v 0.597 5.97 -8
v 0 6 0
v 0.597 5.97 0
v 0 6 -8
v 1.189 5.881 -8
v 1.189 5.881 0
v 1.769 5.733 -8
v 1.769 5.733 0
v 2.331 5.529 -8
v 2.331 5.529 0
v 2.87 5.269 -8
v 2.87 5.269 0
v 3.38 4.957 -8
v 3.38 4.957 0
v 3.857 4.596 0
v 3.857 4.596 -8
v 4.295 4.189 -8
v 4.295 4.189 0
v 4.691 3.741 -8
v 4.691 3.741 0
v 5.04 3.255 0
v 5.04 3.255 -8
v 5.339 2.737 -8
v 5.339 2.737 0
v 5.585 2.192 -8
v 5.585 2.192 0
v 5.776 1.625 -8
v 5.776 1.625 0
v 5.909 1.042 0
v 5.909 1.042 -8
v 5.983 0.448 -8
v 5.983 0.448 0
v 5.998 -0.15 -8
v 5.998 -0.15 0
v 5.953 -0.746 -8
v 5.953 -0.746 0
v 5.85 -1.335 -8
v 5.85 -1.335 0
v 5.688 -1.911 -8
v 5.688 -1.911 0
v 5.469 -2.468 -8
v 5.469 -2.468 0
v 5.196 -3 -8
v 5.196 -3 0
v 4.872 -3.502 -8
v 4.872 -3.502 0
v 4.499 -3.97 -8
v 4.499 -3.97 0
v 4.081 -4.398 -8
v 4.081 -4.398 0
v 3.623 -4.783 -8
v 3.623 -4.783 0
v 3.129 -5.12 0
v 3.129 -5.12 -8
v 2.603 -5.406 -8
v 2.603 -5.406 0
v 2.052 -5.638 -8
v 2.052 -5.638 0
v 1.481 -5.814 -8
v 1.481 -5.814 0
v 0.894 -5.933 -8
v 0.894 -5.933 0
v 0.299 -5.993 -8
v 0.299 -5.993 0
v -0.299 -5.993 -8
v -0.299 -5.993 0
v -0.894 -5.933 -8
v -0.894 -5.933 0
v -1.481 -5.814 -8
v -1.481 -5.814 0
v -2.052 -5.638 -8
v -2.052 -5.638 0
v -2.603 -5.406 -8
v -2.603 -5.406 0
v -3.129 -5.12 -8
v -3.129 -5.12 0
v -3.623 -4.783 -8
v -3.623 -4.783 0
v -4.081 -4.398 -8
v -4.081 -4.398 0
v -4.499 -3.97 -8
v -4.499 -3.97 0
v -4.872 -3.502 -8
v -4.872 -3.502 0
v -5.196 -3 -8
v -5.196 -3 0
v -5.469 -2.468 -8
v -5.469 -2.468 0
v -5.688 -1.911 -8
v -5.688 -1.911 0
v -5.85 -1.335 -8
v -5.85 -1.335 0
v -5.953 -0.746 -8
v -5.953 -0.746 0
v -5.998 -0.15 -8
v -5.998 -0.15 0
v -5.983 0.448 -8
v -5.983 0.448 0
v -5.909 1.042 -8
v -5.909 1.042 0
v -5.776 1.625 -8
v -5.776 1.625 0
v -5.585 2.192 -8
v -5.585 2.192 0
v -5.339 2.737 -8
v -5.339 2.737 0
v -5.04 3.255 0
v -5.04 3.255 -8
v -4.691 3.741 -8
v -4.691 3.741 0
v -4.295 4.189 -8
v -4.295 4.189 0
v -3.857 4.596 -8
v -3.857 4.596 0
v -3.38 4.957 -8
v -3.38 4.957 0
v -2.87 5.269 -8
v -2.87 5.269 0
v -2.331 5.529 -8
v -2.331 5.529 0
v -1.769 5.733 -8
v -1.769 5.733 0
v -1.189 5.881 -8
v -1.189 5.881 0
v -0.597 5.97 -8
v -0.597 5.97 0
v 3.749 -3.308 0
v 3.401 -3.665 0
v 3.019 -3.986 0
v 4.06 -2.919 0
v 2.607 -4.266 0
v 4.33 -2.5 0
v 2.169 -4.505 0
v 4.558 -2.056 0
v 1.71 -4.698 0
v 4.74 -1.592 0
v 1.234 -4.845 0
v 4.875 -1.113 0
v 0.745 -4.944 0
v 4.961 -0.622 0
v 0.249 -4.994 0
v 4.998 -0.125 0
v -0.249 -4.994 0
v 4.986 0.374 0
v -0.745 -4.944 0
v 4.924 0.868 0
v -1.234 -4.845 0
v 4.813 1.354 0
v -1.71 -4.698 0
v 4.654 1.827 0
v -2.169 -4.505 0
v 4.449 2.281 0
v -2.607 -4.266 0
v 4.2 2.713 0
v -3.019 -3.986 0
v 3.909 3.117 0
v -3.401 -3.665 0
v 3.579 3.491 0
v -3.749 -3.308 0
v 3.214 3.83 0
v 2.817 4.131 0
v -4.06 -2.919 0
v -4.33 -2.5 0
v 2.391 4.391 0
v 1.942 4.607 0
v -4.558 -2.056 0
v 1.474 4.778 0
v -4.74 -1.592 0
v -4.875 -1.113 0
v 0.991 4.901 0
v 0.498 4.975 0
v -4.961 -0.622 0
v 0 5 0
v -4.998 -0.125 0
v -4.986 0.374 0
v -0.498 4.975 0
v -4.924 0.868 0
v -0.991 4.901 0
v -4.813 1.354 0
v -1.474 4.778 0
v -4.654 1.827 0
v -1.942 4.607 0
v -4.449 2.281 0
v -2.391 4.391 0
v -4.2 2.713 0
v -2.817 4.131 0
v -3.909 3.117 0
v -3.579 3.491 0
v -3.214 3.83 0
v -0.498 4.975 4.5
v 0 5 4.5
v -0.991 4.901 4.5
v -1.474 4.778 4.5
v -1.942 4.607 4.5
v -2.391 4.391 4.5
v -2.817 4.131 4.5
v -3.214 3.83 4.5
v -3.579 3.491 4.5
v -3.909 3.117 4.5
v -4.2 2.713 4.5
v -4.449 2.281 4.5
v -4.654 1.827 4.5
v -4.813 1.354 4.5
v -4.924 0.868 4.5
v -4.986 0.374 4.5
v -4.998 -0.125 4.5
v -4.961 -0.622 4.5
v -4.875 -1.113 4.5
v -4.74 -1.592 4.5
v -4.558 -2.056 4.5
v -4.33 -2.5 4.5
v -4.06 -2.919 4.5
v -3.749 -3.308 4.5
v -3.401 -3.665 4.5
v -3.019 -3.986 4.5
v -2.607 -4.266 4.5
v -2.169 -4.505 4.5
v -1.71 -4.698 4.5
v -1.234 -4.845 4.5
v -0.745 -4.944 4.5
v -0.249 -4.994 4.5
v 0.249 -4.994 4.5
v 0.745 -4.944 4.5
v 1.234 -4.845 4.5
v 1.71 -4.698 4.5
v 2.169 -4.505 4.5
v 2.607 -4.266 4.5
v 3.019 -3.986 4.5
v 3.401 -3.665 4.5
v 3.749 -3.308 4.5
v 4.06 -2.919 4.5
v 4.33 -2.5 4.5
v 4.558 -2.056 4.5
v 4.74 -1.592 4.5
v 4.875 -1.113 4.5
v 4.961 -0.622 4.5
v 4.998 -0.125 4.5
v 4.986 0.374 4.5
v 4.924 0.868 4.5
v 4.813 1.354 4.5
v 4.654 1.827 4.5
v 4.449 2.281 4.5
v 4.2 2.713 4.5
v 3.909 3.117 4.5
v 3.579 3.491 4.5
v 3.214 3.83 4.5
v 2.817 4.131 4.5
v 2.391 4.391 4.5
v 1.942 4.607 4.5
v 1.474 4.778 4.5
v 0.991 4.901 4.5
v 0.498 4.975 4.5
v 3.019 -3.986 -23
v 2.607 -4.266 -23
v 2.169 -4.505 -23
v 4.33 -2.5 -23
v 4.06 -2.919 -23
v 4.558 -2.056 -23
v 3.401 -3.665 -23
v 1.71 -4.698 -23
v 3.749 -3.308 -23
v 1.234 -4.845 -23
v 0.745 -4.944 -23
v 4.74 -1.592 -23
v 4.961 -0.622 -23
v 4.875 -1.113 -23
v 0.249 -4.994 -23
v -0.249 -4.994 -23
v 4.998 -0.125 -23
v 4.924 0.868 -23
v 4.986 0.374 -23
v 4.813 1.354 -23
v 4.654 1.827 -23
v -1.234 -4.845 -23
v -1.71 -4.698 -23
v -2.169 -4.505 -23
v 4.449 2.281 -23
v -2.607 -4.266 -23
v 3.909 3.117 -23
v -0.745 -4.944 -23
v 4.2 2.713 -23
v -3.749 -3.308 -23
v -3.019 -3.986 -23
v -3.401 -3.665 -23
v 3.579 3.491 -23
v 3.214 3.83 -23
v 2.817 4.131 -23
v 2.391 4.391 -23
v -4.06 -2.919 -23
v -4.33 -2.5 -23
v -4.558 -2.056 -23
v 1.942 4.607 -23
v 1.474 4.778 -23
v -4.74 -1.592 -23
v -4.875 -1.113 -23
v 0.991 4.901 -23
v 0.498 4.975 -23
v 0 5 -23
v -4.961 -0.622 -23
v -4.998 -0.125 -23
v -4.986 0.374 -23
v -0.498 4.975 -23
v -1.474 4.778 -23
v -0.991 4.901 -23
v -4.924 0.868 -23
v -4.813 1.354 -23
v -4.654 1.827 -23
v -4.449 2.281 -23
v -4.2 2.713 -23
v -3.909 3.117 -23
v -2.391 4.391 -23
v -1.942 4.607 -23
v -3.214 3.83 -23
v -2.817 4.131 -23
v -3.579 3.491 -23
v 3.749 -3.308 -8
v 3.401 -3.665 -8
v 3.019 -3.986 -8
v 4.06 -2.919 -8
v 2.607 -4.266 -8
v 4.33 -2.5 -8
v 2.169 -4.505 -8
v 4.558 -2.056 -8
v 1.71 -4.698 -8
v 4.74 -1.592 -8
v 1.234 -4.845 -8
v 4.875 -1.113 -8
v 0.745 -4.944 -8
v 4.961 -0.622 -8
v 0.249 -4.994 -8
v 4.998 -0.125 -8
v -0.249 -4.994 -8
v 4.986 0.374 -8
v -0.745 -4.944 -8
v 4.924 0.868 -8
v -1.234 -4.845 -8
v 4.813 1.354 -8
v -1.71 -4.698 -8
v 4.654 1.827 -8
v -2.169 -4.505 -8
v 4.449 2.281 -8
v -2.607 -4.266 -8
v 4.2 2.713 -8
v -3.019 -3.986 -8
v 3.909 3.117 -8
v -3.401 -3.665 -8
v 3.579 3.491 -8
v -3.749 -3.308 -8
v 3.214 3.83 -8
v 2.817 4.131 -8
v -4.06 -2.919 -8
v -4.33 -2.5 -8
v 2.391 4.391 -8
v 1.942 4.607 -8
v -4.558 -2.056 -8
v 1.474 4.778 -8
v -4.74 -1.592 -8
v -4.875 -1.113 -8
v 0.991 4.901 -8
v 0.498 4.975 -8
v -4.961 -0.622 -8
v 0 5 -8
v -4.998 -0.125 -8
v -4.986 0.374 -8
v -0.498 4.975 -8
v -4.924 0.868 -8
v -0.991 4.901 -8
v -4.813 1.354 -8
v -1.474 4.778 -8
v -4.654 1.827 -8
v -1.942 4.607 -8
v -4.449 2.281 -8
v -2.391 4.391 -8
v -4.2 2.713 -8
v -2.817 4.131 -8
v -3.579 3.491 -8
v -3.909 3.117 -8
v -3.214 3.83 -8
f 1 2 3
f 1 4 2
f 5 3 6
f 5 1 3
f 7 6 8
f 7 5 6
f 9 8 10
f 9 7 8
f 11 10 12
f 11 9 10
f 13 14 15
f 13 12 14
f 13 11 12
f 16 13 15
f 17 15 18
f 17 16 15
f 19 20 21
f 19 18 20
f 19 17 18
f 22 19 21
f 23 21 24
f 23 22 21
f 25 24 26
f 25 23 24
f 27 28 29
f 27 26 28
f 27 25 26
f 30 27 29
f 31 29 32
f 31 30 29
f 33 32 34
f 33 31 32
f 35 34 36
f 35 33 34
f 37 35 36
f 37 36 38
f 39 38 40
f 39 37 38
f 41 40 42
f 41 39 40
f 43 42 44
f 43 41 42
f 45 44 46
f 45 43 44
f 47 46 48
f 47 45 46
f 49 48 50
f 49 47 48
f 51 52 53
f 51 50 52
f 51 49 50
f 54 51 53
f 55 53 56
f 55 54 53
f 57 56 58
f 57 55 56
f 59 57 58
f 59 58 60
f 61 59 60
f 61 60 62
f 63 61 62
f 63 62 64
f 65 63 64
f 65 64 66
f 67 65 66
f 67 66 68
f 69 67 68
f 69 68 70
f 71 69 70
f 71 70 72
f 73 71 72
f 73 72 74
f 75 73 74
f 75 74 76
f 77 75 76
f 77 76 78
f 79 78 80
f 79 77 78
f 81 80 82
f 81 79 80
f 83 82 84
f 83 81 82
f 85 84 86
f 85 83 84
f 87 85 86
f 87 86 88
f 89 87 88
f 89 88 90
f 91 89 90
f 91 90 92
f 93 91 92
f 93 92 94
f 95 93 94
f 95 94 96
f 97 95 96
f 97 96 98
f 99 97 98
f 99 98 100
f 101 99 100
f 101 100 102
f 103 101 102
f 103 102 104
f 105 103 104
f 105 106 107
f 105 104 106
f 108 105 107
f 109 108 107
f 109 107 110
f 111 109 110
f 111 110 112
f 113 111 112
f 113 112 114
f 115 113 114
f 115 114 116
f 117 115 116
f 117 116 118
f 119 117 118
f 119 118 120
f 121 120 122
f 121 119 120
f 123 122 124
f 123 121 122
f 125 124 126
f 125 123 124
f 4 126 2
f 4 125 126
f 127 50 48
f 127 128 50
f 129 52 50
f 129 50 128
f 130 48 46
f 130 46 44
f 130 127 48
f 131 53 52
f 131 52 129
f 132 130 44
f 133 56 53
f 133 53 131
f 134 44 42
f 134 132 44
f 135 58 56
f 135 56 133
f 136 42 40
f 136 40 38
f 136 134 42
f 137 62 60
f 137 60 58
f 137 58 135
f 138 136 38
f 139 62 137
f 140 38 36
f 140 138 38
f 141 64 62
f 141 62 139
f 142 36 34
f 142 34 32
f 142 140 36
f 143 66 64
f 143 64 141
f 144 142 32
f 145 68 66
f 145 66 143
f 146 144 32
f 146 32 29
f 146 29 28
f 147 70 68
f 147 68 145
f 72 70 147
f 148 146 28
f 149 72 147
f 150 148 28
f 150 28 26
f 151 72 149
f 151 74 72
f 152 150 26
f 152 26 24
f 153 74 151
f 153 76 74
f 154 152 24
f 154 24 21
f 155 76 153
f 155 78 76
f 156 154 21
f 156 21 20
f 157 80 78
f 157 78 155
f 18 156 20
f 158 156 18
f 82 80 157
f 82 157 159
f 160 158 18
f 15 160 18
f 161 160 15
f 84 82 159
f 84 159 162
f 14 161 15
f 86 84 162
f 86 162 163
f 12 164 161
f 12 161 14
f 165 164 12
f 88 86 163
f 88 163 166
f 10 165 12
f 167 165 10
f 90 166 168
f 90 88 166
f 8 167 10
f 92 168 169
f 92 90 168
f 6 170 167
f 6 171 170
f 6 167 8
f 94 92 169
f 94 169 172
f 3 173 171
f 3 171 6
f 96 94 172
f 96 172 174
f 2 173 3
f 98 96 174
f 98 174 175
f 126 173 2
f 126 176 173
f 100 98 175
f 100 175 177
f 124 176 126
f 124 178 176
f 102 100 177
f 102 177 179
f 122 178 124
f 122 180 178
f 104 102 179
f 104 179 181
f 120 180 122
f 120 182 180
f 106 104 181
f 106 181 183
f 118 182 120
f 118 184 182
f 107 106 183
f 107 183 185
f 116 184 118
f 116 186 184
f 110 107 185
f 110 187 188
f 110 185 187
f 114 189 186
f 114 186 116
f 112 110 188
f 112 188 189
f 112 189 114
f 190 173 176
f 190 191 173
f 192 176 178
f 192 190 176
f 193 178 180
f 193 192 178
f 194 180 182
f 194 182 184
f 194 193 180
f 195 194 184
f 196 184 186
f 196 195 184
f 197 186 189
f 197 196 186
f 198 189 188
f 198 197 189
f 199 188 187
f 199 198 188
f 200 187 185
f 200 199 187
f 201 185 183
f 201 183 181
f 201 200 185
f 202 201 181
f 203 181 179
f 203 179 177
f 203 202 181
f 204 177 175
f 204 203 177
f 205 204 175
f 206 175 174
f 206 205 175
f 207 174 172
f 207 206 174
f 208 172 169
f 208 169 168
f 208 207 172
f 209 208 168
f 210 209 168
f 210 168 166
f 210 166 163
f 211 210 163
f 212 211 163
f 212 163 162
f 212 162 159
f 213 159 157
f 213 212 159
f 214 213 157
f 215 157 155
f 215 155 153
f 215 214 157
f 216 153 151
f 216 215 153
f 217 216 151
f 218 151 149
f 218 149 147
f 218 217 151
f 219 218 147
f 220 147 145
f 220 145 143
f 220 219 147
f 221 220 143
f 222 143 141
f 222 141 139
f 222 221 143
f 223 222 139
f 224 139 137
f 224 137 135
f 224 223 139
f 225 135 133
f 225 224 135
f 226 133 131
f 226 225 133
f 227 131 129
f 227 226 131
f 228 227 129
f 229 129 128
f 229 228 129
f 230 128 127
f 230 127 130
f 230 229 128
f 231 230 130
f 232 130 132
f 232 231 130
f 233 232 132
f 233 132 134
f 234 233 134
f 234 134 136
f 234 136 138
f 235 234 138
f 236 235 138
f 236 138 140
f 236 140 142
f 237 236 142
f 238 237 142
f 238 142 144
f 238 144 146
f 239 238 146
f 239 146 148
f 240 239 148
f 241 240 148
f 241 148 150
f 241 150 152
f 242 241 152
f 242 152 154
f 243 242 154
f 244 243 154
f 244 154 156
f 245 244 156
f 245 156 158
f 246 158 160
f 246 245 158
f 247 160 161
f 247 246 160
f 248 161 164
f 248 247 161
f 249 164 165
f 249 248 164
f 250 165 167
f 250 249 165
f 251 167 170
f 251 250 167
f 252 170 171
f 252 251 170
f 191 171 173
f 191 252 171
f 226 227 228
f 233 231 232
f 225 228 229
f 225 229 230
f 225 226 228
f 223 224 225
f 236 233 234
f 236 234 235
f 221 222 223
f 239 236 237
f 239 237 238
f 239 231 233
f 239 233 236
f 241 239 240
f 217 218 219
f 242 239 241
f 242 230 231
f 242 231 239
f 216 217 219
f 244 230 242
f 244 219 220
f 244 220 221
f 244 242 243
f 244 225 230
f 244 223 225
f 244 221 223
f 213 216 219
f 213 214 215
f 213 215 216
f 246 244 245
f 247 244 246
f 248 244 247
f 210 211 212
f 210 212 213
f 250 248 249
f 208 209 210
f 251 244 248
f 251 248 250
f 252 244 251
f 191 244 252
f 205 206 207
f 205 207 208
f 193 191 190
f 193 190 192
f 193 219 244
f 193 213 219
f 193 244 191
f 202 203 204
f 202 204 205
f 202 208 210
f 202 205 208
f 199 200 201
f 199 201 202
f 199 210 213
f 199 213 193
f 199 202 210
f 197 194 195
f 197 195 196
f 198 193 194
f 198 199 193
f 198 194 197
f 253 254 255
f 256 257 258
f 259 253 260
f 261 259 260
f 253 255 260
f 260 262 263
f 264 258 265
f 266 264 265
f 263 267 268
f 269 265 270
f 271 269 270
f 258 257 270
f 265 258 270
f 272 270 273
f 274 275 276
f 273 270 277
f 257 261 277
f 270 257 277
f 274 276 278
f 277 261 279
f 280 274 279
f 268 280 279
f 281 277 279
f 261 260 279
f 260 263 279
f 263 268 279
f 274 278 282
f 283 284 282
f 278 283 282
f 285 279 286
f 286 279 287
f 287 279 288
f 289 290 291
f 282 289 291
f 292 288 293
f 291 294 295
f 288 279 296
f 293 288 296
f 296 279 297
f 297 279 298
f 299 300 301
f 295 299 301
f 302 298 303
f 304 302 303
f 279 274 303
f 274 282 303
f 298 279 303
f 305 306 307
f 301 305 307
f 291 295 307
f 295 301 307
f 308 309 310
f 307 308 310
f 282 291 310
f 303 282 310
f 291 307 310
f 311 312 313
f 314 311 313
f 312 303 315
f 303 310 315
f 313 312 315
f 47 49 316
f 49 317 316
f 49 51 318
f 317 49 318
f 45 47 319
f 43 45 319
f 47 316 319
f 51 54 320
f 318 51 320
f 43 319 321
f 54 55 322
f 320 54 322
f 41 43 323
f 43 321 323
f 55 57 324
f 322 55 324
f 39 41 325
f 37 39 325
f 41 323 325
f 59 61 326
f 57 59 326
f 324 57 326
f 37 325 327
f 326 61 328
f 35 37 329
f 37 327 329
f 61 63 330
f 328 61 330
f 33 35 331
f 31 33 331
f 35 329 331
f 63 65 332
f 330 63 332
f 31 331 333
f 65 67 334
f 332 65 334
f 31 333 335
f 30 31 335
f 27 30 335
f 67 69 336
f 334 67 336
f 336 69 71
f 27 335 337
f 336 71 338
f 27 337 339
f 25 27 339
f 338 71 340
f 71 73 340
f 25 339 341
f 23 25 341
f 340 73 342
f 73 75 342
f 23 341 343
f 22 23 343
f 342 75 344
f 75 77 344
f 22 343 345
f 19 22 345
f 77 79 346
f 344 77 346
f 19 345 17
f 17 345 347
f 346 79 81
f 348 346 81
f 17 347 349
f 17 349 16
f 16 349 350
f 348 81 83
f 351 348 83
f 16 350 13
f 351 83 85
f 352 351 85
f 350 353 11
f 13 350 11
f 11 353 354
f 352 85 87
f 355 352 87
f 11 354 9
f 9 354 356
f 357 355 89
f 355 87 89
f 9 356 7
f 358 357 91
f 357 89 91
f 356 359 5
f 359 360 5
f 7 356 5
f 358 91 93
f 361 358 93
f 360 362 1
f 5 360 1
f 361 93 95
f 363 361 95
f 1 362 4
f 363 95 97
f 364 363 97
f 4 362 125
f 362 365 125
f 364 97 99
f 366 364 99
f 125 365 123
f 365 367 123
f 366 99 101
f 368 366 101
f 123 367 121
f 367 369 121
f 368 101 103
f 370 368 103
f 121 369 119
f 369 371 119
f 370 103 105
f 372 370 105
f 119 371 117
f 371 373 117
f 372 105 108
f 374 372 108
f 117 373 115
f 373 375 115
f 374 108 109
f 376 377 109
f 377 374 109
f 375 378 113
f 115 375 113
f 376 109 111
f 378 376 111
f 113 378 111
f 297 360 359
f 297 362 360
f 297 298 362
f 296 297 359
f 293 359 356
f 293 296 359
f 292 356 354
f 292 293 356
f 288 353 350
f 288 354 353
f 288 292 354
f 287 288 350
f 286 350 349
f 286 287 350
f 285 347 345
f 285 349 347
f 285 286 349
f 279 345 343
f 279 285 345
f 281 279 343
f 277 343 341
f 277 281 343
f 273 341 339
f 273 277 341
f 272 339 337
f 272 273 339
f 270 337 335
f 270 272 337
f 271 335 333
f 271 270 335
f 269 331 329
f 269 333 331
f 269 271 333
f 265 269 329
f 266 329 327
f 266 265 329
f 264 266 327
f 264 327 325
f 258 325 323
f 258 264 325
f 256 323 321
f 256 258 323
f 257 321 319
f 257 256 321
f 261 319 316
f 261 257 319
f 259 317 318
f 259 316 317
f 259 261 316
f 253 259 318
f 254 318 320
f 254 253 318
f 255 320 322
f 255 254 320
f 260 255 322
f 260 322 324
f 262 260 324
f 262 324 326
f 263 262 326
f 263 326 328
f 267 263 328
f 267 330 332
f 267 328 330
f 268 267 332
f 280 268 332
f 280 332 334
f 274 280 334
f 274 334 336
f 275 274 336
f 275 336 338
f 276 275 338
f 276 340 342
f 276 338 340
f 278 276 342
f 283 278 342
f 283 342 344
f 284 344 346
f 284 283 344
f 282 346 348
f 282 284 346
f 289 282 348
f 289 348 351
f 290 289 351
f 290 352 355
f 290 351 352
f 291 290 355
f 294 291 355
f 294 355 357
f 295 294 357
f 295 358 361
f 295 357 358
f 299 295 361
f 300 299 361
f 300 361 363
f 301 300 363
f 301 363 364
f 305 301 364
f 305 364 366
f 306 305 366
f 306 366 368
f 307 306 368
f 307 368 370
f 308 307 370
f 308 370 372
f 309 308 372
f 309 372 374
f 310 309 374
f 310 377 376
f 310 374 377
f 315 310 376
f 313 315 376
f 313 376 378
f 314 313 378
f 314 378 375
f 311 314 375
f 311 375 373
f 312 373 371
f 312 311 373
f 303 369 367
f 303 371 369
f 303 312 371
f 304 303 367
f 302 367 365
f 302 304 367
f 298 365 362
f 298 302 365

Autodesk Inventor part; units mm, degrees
ref_plane "YZ Plane" through (0, 0, 0) normal (1, 0, 0) x (0, 1, 0)
ref_plane "XZ Plane" through (0, 0, 0) normal (0, 1, 0) x (-1, 0, 0)
ref_plane "XY Plane" through (0, 0, 0) normal (0, 0, 1) x (1, 0, 0)
sketch "スケッチ1" plane through (0, 0, 0) normal (1, 0, 0) x (0, 1, 0)
  line L0 (0, 0) -> (5, 0)
  line L1 (5, 0) -> (5, 4.5)
  line L2 (5, 4.5) -> (0, 4.5)
  line L3 (0, 4.5) -> (0, 0)
  line L4 (0, 0) -> (6, 0)
  line L5 (6, 0) -> (6, -8)
  line L6 (6, -8) -> (0, -8)
  line L7 (0, -8) -> (0, 0)
  line L8 (0, -8) -> (5, -8)
  line L9 (5, -8) -> (5, -23)
  line L10 (5, -23) -> (0, -23)
  line L11 (0, -23) -> (0, -8)
  point P0 (5, 0)
  dimension "d0" = 5
  dimension "d1" = 4.5
  dimension "d2" = 6
  dimension "d3" = 8
  dimension "d4" = 15
revolve "回転1" add sketch "スケッチ1" angle 360 about axis through (0, 0, -23) along (0, 0, 1)
properties part number "出力ピン" material "鋼、炭素鋼"
